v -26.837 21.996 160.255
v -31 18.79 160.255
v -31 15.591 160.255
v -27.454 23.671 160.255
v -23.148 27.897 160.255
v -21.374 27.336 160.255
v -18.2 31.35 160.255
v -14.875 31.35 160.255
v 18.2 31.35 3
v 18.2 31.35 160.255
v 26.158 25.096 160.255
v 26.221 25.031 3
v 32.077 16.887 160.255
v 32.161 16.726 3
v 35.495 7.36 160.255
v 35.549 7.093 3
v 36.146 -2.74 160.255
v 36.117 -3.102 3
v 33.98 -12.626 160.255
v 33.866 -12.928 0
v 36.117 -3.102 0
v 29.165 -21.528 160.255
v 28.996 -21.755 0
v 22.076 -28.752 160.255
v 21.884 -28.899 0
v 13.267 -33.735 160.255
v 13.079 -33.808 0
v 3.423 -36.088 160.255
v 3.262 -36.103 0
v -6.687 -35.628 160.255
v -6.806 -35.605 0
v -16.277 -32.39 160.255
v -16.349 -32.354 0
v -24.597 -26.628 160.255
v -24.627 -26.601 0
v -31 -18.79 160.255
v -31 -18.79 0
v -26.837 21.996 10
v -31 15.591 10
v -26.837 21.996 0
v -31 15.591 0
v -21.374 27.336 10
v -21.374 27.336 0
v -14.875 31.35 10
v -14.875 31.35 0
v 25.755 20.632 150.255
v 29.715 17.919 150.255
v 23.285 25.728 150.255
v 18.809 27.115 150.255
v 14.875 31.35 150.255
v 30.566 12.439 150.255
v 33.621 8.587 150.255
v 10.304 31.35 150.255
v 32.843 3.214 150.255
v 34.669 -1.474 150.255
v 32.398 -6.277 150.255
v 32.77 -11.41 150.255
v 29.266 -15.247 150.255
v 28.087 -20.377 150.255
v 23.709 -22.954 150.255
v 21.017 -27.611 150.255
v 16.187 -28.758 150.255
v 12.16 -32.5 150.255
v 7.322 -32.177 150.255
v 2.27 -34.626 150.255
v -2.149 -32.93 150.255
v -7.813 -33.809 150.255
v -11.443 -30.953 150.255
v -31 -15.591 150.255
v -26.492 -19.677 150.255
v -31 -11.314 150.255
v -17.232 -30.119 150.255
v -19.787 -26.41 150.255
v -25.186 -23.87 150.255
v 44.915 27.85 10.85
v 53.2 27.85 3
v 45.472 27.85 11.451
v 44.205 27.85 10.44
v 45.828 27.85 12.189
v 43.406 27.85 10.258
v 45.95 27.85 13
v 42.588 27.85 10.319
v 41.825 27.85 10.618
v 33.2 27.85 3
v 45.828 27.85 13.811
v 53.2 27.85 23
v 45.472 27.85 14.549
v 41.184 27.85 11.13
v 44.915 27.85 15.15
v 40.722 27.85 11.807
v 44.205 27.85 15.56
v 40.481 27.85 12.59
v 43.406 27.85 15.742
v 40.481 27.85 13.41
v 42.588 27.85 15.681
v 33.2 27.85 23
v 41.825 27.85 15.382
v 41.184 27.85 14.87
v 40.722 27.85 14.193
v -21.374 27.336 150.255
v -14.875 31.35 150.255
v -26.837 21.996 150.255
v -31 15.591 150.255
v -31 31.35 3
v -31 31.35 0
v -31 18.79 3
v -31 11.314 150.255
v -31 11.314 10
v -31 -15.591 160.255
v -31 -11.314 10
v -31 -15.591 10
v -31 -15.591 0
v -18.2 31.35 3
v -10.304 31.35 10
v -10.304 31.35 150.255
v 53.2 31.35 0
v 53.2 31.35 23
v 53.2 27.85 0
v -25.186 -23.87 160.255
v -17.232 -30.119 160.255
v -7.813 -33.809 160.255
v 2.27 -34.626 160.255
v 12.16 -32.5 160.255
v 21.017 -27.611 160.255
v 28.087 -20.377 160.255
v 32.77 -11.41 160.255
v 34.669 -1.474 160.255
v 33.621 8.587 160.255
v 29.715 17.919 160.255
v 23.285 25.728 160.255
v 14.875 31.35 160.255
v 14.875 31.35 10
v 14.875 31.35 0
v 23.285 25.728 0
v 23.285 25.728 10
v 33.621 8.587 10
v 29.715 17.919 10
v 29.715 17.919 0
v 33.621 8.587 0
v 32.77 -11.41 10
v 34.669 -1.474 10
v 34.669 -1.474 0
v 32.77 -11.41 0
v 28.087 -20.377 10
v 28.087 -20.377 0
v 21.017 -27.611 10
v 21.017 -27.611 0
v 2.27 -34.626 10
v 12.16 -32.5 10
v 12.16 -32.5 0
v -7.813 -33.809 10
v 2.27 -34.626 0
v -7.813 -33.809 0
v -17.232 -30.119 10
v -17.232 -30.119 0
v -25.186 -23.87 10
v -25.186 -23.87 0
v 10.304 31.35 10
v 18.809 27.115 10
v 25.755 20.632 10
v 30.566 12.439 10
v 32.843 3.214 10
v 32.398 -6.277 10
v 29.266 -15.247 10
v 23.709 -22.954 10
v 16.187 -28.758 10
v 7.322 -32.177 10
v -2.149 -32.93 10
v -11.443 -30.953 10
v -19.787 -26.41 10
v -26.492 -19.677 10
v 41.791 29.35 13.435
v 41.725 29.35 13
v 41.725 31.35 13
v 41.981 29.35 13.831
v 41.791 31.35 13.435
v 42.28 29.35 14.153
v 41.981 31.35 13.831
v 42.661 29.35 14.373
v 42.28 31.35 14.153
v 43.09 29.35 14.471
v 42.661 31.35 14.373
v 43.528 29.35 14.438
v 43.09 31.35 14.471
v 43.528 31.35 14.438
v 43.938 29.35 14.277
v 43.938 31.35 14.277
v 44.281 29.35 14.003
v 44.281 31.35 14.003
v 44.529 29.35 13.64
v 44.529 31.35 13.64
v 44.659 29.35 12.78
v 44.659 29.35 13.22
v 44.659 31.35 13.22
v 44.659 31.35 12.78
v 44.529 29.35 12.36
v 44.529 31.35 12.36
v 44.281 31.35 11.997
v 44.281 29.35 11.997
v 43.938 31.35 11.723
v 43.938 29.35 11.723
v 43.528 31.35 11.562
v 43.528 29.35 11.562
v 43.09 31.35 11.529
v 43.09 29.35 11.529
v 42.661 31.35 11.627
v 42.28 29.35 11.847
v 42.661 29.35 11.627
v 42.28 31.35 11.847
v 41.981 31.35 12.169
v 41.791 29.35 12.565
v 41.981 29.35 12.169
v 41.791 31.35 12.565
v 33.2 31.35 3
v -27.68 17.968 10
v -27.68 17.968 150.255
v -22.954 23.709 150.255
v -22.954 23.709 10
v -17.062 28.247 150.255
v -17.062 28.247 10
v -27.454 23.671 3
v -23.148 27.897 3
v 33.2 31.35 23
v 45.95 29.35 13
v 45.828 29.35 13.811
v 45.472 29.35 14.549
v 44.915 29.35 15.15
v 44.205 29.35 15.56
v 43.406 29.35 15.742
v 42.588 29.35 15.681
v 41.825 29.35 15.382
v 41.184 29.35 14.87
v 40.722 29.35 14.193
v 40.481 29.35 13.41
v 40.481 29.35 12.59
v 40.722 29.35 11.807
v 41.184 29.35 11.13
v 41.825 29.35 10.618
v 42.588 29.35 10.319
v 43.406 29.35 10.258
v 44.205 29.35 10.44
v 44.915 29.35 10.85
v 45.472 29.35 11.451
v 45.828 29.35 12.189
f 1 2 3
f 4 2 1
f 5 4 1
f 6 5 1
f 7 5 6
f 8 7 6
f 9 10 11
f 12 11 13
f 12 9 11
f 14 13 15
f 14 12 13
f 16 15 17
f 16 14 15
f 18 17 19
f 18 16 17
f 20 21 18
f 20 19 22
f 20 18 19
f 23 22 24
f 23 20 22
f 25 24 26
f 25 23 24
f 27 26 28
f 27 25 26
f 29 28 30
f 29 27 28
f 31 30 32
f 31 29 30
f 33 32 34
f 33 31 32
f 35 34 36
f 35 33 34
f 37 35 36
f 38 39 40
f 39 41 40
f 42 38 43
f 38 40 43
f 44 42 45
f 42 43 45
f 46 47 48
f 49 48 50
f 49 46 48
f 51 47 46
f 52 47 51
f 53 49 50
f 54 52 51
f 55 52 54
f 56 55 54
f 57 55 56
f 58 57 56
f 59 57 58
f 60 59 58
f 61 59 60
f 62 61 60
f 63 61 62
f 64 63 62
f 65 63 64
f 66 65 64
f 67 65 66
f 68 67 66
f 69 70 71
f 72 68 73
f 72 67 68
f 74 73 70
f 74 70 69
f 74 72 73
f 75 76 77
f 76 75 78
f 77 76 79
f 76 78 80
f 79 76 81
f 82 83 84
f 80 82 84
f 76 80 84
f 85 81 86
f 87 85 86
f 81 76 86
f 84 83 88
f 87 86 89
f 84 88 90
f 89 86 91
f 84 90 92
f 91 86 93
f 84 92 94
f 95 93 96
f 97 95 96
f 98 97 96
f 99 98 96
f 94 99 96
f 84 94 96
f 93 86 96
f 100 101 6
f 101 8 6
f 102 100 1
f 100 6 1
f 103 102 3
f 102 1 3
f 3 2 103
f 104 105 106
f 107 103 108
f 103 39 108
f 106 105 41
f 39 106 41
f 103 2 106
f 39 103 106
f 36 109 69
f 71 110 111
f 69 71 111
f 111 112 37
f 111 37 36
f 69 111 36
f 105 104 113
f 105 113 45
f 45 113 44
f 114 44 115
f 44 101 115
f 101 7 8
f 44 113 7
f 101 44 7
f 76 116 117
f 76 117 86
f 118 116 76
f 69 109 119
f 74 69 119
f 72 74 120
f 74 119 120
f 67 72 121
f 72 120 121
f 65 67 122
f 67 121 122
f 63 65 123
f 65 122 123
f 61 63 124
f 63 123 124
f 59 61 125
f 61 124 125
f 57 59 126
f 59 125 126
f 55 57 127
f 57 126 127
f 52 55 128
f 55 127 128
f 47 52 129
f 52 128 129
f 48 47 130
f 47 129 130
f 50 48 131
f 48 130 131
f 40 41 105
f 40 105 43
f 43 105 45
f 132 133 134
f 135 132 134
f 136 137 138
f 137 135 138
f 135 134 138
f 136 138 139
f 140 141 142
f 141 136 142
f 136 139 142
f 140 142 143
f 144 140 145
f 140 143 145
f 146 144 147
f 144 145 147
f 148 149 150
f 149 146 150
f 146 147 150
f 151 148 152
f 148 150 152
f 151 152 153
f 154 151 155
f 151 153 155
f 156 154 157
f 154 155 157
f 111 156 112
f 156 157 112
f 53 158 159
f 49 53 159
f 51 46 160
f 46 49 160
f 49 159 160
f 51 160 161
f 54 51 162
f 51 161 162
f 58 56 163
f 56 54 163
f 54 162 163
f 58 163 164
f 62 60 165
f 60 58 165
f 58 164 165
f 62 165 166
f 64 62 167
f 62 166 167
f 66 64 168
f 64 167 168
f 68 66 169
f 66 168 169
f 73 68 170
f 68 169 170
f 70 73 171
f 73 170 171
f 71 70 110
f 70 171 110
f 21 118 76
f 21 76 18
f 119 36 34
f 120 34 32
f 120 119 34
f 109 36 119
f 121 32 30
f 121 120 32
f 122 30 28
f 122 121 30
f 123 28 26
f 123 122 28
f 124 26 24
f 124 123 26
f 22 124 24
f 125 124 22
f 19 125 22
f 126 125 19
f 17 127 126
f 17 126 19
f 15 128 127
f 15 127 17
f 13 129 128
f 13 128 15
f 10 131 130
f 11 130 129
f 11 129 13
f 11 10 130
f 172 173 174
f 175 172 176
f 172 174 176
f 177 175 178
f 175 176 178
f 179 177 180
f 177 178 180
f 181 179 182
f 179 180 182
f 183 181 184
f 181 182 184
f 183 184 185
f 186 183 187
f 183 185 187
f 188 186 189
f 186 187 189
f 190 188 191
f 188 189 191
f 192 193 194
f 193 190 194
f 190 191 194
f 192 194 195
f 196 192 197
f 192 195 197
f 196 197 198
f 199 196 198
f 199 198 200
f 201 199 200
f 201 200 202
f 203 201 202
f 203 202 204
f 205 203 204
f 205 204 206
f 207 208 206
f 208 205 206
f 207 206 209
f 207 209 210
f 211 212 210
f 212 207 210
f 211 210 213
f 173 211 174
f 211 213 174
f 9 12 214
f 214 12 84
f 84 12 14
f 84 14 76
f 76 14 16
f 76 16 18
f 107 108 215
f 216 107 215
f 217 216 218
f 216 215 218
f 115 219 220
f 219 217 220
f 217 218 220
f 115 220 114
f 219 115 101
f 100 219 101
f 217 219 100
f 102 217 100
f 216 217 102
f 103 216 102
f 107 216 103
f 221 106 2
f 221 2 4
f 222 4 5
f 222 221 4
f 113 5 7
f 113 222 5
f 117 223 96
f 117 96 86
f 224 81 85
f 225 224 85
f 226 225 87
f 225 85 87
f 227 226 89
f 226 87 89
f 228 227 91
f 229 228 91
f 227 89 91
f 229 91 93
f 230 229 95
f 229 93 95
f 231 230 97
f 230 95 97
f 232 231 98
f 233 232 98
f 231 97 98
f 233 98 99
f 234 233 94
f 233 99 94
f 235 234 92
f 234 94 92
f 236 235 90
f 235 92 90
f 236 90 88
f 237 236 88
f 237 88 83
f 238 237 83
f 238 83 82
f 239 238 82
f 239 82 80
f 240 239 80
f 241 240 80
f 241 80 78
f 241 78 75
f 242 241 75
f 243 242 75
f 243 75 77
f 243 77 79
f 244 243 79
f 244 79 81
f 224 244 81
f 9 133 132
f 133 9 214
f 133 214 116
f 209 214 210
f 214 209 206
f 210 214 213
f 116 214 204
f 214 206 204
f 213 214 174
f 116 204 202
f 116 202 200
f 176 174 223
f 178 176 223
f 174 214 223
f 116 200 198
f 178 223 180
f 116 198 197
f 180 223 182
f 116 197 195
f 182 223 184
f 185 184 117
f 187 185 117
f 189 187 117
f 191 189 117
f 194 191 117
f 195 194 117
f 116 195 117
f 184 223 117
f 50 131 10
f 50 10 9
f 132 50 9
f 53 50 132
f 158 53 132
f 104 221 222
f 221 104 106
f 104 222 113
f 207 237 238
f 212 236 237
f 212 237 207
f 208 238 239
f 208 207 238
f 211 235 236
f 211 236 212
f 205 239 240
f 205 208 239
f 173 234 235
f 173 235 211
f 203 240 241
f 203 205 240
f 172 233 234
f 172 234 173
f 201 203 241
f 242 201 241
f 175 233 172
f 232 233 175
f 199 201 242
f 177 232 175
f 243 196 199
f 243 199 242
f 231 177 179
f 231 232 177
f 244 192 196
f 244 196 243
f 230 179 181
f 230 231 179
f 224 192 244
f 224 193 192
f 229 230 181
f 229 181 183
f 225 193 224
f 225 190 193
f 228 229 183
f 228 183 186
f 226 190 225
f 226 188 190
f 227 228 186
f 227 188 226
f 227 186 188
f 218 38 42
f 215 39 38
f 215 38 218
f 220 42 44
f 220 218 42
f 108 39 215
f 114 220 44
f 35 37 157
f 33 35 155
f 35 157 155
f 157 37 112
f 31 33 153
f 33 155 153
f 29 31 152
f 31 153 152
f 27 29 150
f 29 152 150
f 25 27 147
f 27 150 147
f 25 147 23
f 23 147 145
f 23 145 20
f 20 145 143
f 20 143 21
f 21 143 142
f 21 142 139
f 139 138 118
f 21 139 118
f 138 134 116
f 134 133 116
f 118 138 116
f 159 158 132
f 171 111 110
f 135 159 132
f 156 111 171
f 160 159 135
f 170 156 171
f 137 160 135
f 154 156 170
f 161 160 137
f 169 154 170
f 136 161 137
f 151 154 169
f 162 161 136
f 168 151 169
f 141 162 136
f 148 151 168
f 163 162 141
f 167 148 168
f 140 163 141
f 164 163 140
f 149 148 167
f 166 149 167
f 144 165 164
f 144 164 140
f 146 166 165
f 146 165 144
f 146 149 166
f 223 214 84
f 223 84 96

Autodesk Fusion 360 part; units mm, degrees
sketch "Sketch1" plane through (0, 0, 0) normal (0, 0, 1) x (1, 0, 0)
  circle A0 centre (0, 0) radius 33
  circle A1 centre (0, 0) radius 36.25
  dimension "d1" = 66
  dimension "d2" = 3.25
extrude "Extrude1" add sketch "Sketch1" along normal blind 160.255 makes body 1
sketch "Sketch2" plane through (0, 0, 160.255) normal (0, 0, 1) x (-1, 0, 0)
  circle A0 centre (0, 0) radius 33
  circle A1 centre (0, 0) radius 36.25
  circle A2 centre (0, 0) radius 34.7
  dimension "d5" = 1.7
extrude "Extrude2" cut sketch "Sketch2" against normal blind 10 contours A2 bodies 1
sketch "Sketch3" plane through (0, 0, 0) normal (0, 0, -1) x (1, 0, 0)
  circle A0 centre (0, 0) radius 33
  circle A1 centre (0, 0) radius 36.25
  circle A2 centre (0, 0) radius 34.7
  dimension "d8" = 1.7
extrude "Extrude3" cut sketch "Sketch3" against normal blind 10 contours A2 bodies 1
sketch "Sketch4" plane through (0, 0, 160.255) normal (0, 0, 1) x (-1, 0, 0)
  circle A0 centre (0, 0) radius 34.7
  circle A1 centre (0, 0) radius 36.25
  circle A2 centre (0, 0) radius 33
  line L0 (0, -33) -> (0, -31.35)
  line L1 (0, -31.35) -> (-25.16, -31.35)
  line L2 (-25.16, -31.35) -> (-25.16, -39.8127)
  line L3 (-25.16, -39.8127) -> (30.2592, -39.8127)
  line L4 (30.2592, -39.8127) -> (30.2592, -31.35)
  line L5 (30.2592, -31.35) -> (0, -31.35)
  dimension "d11" = 1.65
extrude "Extrude4" cut sketch "Sketch4" against normal blind 165 contours A0 A2 L1 L5 | A0 A1 L1 L5 | A2 L0 L1 | A1 L1 L2 L3 L4 L5 | A2 L0 L5 picked at (7.3801, -33.261) picked at (12.9692, -32.6711) bodies 1
sketch "Sketch7" plane through (0, 0, 0) normal (0, 0, -1) x (1, 0, 0)
  line L0 (-18.2, -31.35) -> (-14.8751, -31.35)
  arc A0 (14.8751, -31.35) -> (-14.8751, -31.35) centre (0, 0) ccw
  line L1 (14.8751, -31.35) -> (18.2, -31.35)
  arc A1 (18.2, -31.35) -> (-18.2, -31.35) centre (0, 0) ccw
  line L2 (18.2, -31.35) -> (53.2, -31.35)
  line L3 (53.2, -31.35) -> (53.2, -27.85)
  line L4 (53.2, -27.85) -> (36.117, 3.1018)
  line L5 (0, 0) -> (0, -6.8036)
  line L6 (-18.2, -31.35) -> (-53.2, -31.35)
  line L7 (-53.2, -31.35) -> (-53.2, -27.85)
  line L8 (-53.2, -27.85) -> (-36.117, 3.1018)
  dimension "d16" = 35
  dimension "d17" = 3.5
extrude "Extrude6" add sketch "Sketch7" against normal blind 3 contours A1 L6 L7 L8 | A1 L2 L3 L4 bodies 1
sketch "Sketch8" plane through (0, 31.35, 0) normal (0, 1, 0) x (-1, 0, 0)
  line L0 (-14.8751, 150.255) -> (-14.8751, 160.255)
  line L1 (-14.8751, 160.255) -> (-18.2, 160.255)
  line L2 (-18.2, 160.255) -> (-18.2, 3)
  line L3 (-18.2, 3) -> (-53.2, 3)
  line L4 (-53.2, 3) -> (-53.2, 0)
  line L5 (-53.2, 0) -> (-14.8751, 0)
  line L6 (-14.8751, 0) -> (-14.8751, 10)
  line L7 (-14.8751, 10) -> (-10.3042, 10)
  line L8 (-10.3042, 10) -> (-10.3042, 150.255)
  line L9 (-10.3042, 150.255) -> (-14.8751, 150.255)
  line L10 (-53.2, 3) -> (-33.2, 3)
  line L11 (-33.2, 3) -> (-33.2, 23)
  line L12 (-33.2, 23) -> (-53.2, 23)
  line L13 (-53.2, 23) -> (-53.2, 3)
  circle A0 centre (-43.2, 13) radius 1.475
  line L14 (0, 0) -> (0, 6.2283)
  line L15 (33.2, 23) -> (53.2, 23)
  line L16 (53.2, 23) -> (53.2, 3)
  line L17 (33.2, 3) -> (33.2, 23)
  line L18 (53.2, 3) -> (33.2, 3)
  circle A1 centre (43.2, 13) radius 1.475
  dimension "d20" = 20
  dimension "d21" = 20
  dimension "d22" = 2.95
extrude "Extrude7" add sketch "Sketch8" against normal blind 3.5 contours L3 L10 L11 L12 L13 | L15 L16 L17 L18 bodies 1
sketch "Sketch9" plane through (0, 27.85, 0) normal (0, -1, 0) x (1, 0, 0)
  circle A0 centre (43.2, 13) radius 1.475
  line L0 (53.2, 3) -> (53.2, 23)
  line L1 (53.2, 23) -> (33.2, 23)
  line L2 (33.2, 23) -> (33.2, 3)
  line L3 (33.2, 3) -> (53.2, 3)
  circle A1 centre (43.2, 13) radius 2.75
  line L4 (0, 0) -> (0, 5.7746)
  circle A2 centre (-43.2, 13) radius 2.75
  dimension "d25" = 5.5
extrude "Extrude8" cut sketch "Sketch9" against normal blind 1.5 contours A1 | A2 bodies 1
sketch "Sketch10" plane through (0, 0, 160.255) normal (0, 0, 1) x (-1, 0, 0)
  line L0 (14.8751, -31.35) -> (18.2, -31.35)
  arc A0 (18.2, -31.35) -> (-18.2, -31.35) centre (0, 0) ccw
  line L1 (-18.2, -31.35) -> (-14.8751, -31.35)
  arc A1 (14.8751, -31.35) -> (-14.8751, -31.35) centre (0, 0) ccw
sketch "Sketch11" plane through (0, 0, 0) normal (0, 0, -1) x (1, 0, 0)
  line L0 (-53.2, -31.35) -> (-14.8751, -31.35)
  arc A0 (14.8751, -31.35) -> (-14.8751, -31.35) centre (0, 0) ccw
  line L1 (14.8751, -31.35) -> (53.2, -31.35)
  line L2 (53.2, -31.35) -> (53.2, -27.85)
  line L3 (53.2, -27.85) -> (36.117, 3.1018)
  arc A1 (36.117, 3.1018) -> (-36.117, 3.1018) centre (0, 0) ccw
  line L4 (-36.117, 3.1018) -> (-53.2, -27.85)
  line L5 (-53.2, -27.85) -> (-53.2, -31.35)
  line L6 (-14.8751, -31.35) -> (-10.3042, -31.35)
  arc A2 (10.3042, -31.35) -> (-10.3042, -31.35) centre (0, 0) ccw
  line L7 (10.3042, -31.35) -> (14.8751, -31.35)
  arc A3 (14.8751, -31.35) -> (-14.8751, -31.35) centre (0, 0) ccw
  line L8 (-33, 0) -> (-31, 0)
  line L9 (-31, 0) -> (-31, 28.0411)
  line L10 (-31, 28.0411) -> (-58.7739, 28.0411)
  line L11 (-58.7739, 28.0411) -> (-58.7739, -37.7756)
  line L12 (-58.7739, -37.7756) -> (-31, -37.7756)
  line L13 (-31, -37.7756) -> (-31, 28.0411)
  dimension "d28" = 2
extrude "Extrude9" cut sketch "Sketch11" against normal blind 185 contours L0 A0 A1 L4 L5 A3 L9 L13 | L0 A1 L4 L5 L9 L10 L11 L12 L13 | A0 A2 A3 L9 L13 | A2 L8 L13 | A2 L8 L9 L13 bodies 1 makes body 2 at (-26.25, 19.9984, 103.5033)
